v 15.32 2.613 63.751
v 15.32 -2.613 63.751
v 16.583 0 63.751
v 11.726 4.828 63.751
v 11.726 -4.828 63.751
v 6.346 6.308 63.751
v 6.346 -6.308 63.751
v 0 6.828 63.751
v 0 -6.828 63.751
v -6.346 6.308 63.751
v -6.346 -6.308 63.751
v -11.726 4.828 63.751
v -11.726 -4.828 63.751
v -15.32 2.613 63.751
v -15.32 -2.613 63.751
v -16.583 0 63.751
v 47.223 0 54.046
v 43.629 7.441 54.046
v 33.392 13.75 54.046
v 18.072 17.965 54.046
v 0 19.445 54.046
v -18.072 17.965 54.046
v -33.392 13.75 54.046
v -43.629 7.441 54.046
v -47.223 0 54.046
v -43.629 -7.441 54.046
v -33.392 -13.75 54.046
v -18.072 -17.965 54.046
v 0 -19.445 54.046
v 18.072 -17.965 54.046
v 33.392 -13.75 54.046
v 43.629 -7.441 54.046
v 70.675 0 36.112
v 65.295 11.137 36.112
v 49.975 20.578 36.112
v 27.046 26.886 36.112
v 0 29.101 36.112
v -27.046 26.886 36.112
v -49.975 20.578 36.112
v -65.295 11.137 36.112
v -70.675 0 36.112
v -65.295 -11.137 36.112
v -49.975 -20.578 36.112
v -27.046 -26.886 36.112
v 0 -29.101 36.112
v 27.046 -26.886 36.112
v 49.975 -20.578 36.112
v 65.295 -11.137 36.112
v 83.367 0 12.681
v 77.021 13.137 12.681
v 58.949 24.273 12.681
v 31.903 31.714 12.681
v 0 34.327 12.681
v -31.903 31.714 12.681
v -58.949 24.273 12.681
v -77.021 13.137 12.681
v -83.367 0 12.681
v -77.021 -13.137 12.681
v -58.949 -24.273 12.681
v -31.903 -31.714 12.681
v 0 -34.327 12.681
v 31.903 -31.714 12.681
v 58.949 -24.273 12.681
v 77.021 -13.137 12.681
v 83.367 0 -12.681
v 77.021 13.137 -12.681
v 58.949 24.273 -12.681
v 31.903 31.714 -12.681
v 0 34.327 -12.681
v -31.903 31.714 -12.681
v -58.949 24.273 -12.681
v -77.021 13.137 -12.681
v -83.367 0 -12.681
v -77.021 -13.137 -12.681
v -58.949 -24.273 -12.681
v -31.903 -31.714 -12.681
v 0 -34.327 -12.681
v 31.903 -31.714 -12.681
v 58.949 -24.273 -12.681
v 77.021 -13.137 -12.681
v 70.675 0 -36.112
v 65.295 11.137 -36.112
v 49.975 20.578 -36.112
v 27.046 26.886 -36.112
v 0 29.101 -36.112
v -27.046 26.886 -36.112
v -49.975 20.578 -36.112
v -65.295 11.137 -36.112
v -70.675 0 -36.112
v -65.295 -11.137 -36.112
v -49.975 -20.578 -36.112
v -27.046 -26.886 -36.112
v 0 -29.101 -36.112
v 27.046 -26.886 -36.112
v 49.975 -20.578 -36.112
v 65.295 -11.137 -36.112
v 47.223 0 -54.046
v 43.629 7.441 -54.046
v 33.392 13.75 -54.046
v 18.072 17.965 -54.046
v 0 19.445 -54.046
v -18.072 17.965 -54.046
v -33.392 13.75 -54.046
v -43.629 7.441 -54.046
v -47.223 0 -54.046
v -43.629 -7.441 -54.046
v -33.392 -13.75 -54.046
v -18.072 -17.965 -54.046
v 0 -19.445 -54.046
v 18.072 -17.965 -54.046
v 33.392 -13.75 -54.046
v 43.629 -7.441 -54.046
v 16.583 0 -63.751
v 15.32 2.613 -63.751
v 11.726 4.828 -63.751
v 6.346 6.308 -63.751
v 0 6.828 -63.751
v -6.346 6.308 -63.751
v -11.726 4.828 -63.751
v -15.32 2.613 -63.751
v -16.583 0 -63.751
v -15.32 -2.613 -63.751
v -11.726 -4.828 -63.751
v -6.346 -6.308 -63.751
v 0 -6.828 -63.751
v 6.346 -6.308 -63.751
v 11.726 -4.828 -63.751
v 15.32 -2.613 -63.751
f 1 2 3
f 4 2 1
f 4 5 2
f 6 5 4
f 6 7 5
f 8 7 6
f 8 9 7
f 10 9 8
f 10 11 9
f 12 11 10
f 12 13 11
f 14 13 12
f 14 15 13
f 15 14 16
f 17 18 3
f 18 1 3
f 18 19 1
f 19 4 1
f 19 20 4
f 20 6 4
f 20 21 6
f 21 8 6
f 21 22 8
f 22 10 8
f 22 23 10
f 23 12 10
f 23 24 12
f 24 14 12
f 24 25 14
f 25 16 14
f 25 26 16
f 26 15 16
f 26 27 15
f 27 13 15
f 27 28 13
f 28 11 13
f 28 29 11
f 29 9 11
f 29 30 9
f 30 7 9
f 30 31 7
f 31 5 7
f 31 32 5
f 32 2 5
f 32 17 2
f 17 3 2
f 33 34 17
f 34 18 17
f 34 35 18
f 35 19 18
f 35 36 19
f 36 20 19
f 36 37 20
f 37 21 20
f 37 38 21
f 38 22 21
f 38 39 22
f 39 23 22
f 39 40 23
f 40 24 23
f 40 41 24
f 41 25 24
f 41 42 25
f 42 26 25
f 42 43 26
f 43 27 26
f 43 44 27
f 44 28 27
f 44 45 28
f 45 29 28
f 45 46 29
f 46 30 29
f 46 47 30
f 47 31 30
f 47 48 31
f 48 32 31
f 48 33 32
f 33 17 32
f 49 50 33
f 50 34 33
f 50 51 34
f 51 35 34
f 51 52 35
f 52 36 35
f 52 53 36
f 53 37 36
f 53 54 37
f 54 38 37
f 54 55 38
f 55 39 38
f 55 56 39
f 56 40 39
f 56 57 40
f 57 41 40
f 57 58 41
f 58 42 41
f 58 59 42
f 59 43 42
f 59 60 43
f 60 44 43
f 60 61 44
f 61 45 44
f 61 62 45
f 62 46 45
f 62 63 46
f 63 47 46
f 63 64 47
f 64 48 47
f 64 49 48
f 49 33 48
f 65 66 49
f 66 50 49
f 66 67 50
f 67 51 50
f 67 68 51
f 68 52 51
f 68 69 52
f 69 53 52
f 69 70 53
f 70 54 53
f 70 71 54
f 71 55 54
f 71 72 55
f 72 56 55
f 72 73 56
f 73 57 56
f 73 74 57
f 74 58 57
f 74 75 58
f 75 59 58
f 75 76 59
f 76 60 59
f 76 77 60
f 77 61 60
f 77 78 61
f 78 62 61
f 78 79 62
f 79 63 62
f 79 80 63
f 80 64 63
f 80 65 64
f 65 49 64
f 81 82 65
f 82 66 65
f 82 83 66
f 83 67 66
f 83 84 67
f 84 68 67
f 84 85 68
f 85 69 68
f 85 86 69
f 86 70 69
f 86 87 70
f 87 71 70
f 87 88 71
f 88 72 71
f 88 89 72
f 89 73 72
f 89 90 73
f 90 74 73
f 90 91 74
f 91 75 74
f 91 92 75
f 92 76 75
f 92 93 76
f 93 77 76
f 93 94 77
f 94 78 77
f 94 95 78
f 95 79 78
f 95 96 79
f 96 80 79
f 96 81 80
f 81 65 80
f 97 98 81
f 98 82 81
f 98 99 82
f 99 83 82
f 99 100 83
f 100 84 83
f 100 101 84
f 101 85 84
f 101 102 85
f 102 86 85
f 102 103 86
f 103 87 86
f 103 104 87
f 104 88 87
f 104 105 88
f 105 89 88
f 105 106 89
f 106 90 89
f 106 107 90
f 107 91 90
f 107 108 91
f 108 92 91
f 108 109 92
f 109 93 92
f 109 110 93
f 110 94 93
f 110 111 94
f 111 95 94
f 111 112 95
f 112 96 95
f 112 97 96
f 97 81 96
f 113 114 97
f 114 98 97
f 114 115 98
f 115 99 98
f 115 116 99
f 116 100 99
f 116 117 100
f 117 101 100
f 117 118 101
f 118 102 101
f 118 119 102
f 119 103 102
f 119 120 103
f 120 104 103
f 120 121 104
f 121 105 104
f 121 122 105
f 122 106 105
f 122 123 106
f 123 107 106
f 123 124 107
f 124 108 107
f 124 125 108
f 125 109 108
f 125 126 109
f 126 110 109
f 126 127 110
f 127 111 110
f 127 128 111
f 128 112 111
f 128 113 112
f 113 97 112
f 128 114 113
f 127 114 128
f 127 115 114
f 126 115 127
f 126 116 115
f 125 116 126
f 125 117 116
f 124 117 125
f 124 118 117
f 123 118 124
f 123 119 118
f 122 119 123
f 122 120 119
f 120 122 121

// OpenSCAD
// Generated by SolidPython 1.0.1 on 2020-07-29 00:46:52


scale(v = [17, 7, 13]) {
	sphere(r = 5);
}
/***********************************************
*********      SolidPython code:      **********
************************************************
 
# import packages: SolidPython
from solid import *
from solid.utils import *
from itertools import chain, combinations, permutations


class Resize:

    def __init__(self, scad_file):
        self.scad_file = scad_file
        #self.scad_file = import_scad(scad_file)
        # cone/cylinder param:
        self.r1 = 0
        self.r2 = 0
        self.h = 0
        # rectangular prism param:
        self.w = 0
        self.l = 0
        # ellipse param:
        self.r = 0

    # import OpenScad code (file name corresponds to shape)


    # classify shape + parameters
    def assign(self, param1, param2, param3):
        if self.scad_file == 'cone.scad':
            self.r1 = param1
            self.r2 = param2
            self.h = param3
        elif self.scad_file == 'cylinder.scad':
            self.r1 = param1
            self.r2 = param2
            self.h = param3
        elif self.scad_file == 'rectangularPrism.scad':
            self.h = param1
            self.l = param2
            self.w = param3
        else:
            self.r = param1
            self.h = param2

    # resize parameters
    def iterate(self):
        x = range(3, 20, 2)
        i = 1
        if self.scad_file == 'cone.scad':
            tempList = list(permutations(x, 2))
            for temp in tempList:
                param1 = temp[0]
                param2 = temp[1]
                filepath = 'produced_scad_files/' + 'cone' + str(param1) + '_' + str(param2) + '_' + '.scad'
                scad_render_to_file(cylinder(h=param1, r1=param2, r2=0), filepath)

        elif self.scad_file == 'cylinder.scad':
            tempList = list(permutations(x, 3))
            for temp in tempList:
                param1 = temp[0]
                param2 = temp[1]
                filepath = 'produced_scad_files/' + 'cylinder' + str(param1) + '_' + str(param2) + '_' + '.scad'
                scad_render_to_file(cylinder(h=param1, r1=param2, r2=param2), filepath)

        elif self.scad_file == 'rectangularPrism.scad':
            tempList = list(permutations(x, 3))
            for temp in tempList:
                param1 = temp[0]
                param2 = temp[1]
                param3 = temp[2]
                filepath = 'produced_scad_files/' + 'rectangularPrism' + str(param1) + '_' + str(param2) + '_' + str(
                    param3) + '.scad'
                scad_render_to_file(cube(size=(param1, param2, param3)), filepath)

        elif self.scad_file == 'ellipse.scad':
            tempList = list(permutations(x, 4))
            for temp in tempList:
                param1 = temp[0]
                param2 = temp[1]
                param3 = temp[2]
                param4 = temp[3]
                filepath = 'produced_scad_files/' + 'ellipse' + str(param1) + '_' + str(param2) + '_' + str(param3) + '_' + str(param4) + '.scad'
                scad_render_to_file(scale([param1, param2, param3])(sphere(r=param4)), filepath)

    def render_to_scadfile(self):
        scad_render_to_file(scad, 'example.scad') 
 
************************************************/
